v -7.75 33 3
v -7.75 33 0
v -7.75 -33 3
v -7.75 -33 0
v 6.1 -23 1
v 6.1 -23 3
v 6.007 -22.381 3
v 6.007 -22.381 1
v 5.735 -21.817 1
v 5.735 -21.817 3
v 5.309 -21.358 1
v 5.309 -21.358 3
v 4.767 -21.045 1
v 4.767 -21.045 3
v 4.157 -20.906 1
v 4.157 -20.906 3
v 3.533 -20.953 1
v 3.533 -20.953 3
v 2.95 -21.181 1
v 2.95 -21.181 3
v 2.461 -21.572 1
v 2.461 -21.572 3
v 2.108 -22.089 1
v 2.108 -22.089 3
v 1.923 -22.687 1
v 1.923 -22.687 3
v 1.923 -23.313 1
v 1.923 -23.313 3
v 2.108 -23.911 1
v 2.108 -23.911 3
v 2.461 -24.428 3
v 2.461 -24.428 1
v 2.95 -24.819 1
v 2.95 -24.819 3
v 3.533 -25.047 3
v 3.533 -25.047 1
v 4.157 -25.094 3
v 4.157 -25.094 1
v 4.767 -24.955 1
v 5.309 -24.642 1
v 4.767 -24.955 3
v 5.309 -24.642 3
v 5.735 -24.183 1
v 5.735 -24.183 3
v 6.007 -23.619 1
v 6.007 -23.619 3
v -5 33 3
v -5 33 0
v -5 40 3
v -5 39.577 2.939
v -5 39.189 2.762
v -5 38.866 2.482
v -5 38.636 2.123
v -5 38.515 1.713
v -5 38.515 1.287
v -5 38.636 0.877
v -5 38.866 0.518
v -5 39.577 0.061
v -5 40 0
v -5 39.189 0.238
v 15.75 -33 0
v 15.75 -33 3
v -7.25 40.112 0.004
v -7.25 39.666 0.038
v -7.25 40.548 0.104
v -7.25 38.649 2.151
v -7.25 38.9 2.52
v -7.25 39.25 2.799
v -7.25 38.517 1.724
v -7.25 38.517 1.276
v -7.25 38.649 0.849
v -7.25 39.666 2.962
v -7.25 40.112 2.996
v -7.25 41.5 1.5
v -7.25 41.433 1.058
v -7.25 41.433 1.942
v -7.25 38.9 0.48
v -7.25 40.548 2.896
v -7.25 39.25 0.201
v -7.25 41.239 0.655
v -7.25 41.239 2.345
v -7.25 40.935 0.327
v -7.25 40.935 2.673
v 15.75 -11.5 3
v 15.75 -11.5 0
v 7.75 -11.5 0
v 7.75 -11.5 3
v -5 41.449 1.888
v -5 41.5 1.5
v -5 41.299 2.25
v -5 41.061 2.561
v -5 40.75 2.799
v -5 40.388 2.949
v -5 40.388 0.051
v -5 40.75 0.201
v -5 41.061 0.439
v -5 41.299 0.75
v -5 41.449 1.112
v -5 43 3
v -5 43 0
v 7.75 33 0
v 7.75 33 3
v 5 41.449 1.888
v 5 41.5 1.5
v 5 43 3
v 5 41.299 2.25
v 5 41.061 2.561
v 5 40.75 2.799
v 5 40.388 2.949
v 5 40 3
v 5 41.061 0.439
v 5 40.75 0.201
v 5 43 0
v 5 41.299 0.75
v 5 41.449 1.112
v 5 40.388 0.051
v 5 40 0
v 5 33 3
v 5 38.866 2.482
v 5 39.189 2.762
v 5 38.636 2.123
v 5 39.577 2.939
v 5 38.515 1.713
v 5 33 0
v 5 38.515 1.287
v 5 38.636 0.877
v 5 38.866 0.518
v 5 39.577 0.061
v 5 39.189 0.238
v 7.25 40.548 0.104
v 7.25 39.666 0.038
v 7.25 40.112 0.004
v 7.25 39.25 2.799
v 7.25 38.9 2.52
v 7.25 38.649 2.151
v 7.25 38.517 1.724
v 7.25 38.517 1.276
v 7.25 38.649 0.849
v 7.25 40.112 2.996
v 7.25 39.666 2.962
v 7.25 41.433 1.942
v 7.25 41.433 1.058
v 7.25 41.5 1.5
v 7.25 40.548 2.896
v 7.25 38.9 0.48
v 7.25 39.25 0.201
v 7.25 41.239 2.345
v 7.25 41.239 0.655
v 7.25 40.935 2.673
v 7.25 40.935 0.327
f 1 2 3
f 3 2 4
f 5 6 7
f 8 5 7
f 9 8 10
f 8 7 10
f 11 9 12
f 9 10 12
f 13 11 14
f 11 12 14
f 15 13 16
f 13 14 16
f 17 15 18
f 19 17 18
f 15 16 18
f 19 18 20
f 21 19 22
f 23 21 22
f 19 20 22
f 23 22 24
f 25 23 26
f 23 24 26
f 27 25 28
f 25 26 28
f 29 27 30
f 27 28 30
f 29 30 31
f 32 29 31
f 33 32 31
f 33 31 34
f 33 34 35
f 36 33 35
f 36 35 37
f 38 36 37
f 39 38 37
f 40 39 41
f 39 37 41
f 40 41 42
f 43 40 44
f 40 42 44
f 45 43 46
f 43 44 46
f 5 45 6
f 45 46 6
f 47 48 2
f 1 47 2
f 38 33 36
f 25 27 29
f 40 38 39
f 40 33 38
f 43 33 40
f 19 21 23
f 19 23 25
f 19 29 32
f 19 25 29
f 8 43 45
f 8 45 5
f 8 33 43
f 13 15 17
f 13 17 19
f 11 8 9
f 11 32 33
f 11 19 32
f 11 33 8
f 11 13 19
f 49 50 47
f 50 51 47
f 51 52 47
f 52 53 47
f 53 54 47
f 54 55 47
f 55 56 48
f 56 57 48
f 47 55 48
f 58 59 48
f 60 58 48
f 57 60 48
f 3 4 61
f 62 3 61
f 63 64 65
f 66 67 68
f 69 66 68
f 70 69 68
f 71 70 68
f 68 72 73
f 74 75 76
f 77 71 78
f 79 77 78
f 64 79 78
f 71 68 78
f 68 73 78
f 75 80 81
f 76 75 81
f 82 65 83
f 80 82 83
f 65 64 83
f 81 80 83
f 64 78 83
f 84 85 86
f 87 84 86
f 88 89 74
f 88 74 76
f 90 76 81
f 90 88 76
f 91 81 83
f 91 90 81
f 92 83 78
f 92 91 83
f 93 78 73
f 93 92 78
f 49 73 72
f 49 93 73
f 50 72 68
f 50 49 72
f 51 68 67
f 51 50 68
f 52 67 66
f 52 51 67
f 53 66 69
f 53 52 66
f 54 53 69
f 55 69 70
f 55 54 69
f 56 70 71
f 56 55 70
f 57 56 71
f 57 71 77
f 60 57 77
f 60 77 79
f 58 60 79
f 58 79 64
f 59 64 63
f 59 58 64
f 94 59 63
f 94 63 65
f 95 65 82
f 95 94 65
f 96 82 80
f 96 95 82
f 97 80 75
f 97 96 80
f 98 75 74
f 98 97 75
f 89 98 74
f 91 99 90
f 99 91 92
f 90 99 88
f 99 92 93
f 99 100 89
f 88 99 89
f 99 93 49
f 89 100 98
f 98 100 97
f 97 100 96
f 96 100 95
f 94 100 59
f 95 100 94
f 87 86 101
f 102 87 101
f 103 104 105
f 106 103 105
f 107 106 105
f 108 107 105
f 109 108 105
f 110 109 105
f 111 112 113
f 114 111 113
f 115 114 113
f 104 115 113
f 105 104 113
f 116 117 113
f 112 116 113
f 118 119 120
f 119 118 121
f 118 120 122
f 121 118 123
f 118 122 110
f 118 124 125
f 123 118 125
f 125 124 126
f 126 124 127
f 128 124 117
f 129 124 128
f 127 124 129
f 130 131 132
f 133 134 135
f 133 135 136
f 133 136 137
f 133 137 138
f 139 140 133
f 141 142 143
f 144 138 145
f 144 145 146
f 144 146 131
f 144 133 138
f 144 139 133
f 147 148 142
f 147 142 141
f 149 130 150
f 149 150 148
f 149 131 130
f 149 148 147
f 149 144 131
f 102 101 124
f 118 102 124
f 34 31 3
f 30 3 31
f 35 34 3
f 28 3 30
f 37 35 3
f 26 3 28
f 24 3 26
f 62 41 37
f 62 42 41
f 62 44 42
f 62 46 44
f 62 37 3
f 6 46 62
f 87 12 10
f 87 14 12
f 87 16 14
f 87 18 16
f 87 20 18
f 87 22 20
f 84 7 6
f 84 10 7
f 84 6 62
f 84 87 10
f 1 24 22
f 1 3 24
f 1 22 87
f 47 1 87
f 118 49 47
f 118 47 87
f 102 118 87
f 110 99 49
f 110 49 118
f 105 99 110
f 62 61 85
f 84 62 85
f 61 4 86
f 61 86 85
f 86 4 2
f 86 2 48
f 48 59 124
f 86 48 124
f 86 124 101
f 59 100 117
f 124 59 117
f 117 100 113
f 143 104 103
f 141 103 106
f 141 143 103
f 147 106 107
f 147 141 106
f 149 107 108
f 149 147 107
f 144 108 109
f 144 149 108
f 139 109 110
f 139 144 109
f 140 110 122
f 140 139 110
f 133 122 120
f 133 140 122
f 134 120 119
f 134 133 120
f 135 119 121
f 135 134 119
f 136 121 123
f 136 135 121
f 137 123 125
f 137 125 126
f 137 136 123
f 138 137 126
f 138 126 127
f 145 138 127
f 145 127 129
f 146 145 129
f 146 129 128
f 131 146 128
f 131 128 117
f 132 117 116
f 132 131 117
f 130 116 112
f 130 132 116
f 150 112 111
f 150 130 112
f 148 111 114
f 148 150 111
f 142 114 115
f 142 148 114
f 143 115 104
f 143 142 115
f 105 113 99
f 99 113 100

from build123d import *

# Parameters (mm, degrees)
PAD_DEPTH    = 3
SKETCH001_R  = 1.5
PAD001_DEPTH = 7.25
SKETCH002_R  = 2.1
POCKET_DEPTH = 2


with BuildPart() as part:
    # Sketch → Pad (new body)
    with BuildSketch(Plane.XY):
        Polygon((-7.75, 33), (-7.75, -33), (15.75, -33), (15.75, -11.5), (7.75, -11.5), (7.75, 33), (5, 33), (5, 43), (-5, 43), (-5, 33), align=None)
    extrude(amount=PAD_DEPTH)

    # Sketch001 → Pad001 (join, symmetric)
    with BuildSketch(Plane.YZ):
        with Locations((40, 1.5)):
            Circle(SKETCH001_R)
    extrude(amount=PAD001_DEPTH, both=True)

    # Sketch002 (on Face5 of Pad001) → Pocket (cut)
    with BuildSketch(Plane.XY.offset(3)):
        with Locations((4, -23)):
            Circle(SKETCH002_R)
    extrude(amount=-POCKET_DEPTH, mode=Mode.SUBTRACT)


solid = part.part
